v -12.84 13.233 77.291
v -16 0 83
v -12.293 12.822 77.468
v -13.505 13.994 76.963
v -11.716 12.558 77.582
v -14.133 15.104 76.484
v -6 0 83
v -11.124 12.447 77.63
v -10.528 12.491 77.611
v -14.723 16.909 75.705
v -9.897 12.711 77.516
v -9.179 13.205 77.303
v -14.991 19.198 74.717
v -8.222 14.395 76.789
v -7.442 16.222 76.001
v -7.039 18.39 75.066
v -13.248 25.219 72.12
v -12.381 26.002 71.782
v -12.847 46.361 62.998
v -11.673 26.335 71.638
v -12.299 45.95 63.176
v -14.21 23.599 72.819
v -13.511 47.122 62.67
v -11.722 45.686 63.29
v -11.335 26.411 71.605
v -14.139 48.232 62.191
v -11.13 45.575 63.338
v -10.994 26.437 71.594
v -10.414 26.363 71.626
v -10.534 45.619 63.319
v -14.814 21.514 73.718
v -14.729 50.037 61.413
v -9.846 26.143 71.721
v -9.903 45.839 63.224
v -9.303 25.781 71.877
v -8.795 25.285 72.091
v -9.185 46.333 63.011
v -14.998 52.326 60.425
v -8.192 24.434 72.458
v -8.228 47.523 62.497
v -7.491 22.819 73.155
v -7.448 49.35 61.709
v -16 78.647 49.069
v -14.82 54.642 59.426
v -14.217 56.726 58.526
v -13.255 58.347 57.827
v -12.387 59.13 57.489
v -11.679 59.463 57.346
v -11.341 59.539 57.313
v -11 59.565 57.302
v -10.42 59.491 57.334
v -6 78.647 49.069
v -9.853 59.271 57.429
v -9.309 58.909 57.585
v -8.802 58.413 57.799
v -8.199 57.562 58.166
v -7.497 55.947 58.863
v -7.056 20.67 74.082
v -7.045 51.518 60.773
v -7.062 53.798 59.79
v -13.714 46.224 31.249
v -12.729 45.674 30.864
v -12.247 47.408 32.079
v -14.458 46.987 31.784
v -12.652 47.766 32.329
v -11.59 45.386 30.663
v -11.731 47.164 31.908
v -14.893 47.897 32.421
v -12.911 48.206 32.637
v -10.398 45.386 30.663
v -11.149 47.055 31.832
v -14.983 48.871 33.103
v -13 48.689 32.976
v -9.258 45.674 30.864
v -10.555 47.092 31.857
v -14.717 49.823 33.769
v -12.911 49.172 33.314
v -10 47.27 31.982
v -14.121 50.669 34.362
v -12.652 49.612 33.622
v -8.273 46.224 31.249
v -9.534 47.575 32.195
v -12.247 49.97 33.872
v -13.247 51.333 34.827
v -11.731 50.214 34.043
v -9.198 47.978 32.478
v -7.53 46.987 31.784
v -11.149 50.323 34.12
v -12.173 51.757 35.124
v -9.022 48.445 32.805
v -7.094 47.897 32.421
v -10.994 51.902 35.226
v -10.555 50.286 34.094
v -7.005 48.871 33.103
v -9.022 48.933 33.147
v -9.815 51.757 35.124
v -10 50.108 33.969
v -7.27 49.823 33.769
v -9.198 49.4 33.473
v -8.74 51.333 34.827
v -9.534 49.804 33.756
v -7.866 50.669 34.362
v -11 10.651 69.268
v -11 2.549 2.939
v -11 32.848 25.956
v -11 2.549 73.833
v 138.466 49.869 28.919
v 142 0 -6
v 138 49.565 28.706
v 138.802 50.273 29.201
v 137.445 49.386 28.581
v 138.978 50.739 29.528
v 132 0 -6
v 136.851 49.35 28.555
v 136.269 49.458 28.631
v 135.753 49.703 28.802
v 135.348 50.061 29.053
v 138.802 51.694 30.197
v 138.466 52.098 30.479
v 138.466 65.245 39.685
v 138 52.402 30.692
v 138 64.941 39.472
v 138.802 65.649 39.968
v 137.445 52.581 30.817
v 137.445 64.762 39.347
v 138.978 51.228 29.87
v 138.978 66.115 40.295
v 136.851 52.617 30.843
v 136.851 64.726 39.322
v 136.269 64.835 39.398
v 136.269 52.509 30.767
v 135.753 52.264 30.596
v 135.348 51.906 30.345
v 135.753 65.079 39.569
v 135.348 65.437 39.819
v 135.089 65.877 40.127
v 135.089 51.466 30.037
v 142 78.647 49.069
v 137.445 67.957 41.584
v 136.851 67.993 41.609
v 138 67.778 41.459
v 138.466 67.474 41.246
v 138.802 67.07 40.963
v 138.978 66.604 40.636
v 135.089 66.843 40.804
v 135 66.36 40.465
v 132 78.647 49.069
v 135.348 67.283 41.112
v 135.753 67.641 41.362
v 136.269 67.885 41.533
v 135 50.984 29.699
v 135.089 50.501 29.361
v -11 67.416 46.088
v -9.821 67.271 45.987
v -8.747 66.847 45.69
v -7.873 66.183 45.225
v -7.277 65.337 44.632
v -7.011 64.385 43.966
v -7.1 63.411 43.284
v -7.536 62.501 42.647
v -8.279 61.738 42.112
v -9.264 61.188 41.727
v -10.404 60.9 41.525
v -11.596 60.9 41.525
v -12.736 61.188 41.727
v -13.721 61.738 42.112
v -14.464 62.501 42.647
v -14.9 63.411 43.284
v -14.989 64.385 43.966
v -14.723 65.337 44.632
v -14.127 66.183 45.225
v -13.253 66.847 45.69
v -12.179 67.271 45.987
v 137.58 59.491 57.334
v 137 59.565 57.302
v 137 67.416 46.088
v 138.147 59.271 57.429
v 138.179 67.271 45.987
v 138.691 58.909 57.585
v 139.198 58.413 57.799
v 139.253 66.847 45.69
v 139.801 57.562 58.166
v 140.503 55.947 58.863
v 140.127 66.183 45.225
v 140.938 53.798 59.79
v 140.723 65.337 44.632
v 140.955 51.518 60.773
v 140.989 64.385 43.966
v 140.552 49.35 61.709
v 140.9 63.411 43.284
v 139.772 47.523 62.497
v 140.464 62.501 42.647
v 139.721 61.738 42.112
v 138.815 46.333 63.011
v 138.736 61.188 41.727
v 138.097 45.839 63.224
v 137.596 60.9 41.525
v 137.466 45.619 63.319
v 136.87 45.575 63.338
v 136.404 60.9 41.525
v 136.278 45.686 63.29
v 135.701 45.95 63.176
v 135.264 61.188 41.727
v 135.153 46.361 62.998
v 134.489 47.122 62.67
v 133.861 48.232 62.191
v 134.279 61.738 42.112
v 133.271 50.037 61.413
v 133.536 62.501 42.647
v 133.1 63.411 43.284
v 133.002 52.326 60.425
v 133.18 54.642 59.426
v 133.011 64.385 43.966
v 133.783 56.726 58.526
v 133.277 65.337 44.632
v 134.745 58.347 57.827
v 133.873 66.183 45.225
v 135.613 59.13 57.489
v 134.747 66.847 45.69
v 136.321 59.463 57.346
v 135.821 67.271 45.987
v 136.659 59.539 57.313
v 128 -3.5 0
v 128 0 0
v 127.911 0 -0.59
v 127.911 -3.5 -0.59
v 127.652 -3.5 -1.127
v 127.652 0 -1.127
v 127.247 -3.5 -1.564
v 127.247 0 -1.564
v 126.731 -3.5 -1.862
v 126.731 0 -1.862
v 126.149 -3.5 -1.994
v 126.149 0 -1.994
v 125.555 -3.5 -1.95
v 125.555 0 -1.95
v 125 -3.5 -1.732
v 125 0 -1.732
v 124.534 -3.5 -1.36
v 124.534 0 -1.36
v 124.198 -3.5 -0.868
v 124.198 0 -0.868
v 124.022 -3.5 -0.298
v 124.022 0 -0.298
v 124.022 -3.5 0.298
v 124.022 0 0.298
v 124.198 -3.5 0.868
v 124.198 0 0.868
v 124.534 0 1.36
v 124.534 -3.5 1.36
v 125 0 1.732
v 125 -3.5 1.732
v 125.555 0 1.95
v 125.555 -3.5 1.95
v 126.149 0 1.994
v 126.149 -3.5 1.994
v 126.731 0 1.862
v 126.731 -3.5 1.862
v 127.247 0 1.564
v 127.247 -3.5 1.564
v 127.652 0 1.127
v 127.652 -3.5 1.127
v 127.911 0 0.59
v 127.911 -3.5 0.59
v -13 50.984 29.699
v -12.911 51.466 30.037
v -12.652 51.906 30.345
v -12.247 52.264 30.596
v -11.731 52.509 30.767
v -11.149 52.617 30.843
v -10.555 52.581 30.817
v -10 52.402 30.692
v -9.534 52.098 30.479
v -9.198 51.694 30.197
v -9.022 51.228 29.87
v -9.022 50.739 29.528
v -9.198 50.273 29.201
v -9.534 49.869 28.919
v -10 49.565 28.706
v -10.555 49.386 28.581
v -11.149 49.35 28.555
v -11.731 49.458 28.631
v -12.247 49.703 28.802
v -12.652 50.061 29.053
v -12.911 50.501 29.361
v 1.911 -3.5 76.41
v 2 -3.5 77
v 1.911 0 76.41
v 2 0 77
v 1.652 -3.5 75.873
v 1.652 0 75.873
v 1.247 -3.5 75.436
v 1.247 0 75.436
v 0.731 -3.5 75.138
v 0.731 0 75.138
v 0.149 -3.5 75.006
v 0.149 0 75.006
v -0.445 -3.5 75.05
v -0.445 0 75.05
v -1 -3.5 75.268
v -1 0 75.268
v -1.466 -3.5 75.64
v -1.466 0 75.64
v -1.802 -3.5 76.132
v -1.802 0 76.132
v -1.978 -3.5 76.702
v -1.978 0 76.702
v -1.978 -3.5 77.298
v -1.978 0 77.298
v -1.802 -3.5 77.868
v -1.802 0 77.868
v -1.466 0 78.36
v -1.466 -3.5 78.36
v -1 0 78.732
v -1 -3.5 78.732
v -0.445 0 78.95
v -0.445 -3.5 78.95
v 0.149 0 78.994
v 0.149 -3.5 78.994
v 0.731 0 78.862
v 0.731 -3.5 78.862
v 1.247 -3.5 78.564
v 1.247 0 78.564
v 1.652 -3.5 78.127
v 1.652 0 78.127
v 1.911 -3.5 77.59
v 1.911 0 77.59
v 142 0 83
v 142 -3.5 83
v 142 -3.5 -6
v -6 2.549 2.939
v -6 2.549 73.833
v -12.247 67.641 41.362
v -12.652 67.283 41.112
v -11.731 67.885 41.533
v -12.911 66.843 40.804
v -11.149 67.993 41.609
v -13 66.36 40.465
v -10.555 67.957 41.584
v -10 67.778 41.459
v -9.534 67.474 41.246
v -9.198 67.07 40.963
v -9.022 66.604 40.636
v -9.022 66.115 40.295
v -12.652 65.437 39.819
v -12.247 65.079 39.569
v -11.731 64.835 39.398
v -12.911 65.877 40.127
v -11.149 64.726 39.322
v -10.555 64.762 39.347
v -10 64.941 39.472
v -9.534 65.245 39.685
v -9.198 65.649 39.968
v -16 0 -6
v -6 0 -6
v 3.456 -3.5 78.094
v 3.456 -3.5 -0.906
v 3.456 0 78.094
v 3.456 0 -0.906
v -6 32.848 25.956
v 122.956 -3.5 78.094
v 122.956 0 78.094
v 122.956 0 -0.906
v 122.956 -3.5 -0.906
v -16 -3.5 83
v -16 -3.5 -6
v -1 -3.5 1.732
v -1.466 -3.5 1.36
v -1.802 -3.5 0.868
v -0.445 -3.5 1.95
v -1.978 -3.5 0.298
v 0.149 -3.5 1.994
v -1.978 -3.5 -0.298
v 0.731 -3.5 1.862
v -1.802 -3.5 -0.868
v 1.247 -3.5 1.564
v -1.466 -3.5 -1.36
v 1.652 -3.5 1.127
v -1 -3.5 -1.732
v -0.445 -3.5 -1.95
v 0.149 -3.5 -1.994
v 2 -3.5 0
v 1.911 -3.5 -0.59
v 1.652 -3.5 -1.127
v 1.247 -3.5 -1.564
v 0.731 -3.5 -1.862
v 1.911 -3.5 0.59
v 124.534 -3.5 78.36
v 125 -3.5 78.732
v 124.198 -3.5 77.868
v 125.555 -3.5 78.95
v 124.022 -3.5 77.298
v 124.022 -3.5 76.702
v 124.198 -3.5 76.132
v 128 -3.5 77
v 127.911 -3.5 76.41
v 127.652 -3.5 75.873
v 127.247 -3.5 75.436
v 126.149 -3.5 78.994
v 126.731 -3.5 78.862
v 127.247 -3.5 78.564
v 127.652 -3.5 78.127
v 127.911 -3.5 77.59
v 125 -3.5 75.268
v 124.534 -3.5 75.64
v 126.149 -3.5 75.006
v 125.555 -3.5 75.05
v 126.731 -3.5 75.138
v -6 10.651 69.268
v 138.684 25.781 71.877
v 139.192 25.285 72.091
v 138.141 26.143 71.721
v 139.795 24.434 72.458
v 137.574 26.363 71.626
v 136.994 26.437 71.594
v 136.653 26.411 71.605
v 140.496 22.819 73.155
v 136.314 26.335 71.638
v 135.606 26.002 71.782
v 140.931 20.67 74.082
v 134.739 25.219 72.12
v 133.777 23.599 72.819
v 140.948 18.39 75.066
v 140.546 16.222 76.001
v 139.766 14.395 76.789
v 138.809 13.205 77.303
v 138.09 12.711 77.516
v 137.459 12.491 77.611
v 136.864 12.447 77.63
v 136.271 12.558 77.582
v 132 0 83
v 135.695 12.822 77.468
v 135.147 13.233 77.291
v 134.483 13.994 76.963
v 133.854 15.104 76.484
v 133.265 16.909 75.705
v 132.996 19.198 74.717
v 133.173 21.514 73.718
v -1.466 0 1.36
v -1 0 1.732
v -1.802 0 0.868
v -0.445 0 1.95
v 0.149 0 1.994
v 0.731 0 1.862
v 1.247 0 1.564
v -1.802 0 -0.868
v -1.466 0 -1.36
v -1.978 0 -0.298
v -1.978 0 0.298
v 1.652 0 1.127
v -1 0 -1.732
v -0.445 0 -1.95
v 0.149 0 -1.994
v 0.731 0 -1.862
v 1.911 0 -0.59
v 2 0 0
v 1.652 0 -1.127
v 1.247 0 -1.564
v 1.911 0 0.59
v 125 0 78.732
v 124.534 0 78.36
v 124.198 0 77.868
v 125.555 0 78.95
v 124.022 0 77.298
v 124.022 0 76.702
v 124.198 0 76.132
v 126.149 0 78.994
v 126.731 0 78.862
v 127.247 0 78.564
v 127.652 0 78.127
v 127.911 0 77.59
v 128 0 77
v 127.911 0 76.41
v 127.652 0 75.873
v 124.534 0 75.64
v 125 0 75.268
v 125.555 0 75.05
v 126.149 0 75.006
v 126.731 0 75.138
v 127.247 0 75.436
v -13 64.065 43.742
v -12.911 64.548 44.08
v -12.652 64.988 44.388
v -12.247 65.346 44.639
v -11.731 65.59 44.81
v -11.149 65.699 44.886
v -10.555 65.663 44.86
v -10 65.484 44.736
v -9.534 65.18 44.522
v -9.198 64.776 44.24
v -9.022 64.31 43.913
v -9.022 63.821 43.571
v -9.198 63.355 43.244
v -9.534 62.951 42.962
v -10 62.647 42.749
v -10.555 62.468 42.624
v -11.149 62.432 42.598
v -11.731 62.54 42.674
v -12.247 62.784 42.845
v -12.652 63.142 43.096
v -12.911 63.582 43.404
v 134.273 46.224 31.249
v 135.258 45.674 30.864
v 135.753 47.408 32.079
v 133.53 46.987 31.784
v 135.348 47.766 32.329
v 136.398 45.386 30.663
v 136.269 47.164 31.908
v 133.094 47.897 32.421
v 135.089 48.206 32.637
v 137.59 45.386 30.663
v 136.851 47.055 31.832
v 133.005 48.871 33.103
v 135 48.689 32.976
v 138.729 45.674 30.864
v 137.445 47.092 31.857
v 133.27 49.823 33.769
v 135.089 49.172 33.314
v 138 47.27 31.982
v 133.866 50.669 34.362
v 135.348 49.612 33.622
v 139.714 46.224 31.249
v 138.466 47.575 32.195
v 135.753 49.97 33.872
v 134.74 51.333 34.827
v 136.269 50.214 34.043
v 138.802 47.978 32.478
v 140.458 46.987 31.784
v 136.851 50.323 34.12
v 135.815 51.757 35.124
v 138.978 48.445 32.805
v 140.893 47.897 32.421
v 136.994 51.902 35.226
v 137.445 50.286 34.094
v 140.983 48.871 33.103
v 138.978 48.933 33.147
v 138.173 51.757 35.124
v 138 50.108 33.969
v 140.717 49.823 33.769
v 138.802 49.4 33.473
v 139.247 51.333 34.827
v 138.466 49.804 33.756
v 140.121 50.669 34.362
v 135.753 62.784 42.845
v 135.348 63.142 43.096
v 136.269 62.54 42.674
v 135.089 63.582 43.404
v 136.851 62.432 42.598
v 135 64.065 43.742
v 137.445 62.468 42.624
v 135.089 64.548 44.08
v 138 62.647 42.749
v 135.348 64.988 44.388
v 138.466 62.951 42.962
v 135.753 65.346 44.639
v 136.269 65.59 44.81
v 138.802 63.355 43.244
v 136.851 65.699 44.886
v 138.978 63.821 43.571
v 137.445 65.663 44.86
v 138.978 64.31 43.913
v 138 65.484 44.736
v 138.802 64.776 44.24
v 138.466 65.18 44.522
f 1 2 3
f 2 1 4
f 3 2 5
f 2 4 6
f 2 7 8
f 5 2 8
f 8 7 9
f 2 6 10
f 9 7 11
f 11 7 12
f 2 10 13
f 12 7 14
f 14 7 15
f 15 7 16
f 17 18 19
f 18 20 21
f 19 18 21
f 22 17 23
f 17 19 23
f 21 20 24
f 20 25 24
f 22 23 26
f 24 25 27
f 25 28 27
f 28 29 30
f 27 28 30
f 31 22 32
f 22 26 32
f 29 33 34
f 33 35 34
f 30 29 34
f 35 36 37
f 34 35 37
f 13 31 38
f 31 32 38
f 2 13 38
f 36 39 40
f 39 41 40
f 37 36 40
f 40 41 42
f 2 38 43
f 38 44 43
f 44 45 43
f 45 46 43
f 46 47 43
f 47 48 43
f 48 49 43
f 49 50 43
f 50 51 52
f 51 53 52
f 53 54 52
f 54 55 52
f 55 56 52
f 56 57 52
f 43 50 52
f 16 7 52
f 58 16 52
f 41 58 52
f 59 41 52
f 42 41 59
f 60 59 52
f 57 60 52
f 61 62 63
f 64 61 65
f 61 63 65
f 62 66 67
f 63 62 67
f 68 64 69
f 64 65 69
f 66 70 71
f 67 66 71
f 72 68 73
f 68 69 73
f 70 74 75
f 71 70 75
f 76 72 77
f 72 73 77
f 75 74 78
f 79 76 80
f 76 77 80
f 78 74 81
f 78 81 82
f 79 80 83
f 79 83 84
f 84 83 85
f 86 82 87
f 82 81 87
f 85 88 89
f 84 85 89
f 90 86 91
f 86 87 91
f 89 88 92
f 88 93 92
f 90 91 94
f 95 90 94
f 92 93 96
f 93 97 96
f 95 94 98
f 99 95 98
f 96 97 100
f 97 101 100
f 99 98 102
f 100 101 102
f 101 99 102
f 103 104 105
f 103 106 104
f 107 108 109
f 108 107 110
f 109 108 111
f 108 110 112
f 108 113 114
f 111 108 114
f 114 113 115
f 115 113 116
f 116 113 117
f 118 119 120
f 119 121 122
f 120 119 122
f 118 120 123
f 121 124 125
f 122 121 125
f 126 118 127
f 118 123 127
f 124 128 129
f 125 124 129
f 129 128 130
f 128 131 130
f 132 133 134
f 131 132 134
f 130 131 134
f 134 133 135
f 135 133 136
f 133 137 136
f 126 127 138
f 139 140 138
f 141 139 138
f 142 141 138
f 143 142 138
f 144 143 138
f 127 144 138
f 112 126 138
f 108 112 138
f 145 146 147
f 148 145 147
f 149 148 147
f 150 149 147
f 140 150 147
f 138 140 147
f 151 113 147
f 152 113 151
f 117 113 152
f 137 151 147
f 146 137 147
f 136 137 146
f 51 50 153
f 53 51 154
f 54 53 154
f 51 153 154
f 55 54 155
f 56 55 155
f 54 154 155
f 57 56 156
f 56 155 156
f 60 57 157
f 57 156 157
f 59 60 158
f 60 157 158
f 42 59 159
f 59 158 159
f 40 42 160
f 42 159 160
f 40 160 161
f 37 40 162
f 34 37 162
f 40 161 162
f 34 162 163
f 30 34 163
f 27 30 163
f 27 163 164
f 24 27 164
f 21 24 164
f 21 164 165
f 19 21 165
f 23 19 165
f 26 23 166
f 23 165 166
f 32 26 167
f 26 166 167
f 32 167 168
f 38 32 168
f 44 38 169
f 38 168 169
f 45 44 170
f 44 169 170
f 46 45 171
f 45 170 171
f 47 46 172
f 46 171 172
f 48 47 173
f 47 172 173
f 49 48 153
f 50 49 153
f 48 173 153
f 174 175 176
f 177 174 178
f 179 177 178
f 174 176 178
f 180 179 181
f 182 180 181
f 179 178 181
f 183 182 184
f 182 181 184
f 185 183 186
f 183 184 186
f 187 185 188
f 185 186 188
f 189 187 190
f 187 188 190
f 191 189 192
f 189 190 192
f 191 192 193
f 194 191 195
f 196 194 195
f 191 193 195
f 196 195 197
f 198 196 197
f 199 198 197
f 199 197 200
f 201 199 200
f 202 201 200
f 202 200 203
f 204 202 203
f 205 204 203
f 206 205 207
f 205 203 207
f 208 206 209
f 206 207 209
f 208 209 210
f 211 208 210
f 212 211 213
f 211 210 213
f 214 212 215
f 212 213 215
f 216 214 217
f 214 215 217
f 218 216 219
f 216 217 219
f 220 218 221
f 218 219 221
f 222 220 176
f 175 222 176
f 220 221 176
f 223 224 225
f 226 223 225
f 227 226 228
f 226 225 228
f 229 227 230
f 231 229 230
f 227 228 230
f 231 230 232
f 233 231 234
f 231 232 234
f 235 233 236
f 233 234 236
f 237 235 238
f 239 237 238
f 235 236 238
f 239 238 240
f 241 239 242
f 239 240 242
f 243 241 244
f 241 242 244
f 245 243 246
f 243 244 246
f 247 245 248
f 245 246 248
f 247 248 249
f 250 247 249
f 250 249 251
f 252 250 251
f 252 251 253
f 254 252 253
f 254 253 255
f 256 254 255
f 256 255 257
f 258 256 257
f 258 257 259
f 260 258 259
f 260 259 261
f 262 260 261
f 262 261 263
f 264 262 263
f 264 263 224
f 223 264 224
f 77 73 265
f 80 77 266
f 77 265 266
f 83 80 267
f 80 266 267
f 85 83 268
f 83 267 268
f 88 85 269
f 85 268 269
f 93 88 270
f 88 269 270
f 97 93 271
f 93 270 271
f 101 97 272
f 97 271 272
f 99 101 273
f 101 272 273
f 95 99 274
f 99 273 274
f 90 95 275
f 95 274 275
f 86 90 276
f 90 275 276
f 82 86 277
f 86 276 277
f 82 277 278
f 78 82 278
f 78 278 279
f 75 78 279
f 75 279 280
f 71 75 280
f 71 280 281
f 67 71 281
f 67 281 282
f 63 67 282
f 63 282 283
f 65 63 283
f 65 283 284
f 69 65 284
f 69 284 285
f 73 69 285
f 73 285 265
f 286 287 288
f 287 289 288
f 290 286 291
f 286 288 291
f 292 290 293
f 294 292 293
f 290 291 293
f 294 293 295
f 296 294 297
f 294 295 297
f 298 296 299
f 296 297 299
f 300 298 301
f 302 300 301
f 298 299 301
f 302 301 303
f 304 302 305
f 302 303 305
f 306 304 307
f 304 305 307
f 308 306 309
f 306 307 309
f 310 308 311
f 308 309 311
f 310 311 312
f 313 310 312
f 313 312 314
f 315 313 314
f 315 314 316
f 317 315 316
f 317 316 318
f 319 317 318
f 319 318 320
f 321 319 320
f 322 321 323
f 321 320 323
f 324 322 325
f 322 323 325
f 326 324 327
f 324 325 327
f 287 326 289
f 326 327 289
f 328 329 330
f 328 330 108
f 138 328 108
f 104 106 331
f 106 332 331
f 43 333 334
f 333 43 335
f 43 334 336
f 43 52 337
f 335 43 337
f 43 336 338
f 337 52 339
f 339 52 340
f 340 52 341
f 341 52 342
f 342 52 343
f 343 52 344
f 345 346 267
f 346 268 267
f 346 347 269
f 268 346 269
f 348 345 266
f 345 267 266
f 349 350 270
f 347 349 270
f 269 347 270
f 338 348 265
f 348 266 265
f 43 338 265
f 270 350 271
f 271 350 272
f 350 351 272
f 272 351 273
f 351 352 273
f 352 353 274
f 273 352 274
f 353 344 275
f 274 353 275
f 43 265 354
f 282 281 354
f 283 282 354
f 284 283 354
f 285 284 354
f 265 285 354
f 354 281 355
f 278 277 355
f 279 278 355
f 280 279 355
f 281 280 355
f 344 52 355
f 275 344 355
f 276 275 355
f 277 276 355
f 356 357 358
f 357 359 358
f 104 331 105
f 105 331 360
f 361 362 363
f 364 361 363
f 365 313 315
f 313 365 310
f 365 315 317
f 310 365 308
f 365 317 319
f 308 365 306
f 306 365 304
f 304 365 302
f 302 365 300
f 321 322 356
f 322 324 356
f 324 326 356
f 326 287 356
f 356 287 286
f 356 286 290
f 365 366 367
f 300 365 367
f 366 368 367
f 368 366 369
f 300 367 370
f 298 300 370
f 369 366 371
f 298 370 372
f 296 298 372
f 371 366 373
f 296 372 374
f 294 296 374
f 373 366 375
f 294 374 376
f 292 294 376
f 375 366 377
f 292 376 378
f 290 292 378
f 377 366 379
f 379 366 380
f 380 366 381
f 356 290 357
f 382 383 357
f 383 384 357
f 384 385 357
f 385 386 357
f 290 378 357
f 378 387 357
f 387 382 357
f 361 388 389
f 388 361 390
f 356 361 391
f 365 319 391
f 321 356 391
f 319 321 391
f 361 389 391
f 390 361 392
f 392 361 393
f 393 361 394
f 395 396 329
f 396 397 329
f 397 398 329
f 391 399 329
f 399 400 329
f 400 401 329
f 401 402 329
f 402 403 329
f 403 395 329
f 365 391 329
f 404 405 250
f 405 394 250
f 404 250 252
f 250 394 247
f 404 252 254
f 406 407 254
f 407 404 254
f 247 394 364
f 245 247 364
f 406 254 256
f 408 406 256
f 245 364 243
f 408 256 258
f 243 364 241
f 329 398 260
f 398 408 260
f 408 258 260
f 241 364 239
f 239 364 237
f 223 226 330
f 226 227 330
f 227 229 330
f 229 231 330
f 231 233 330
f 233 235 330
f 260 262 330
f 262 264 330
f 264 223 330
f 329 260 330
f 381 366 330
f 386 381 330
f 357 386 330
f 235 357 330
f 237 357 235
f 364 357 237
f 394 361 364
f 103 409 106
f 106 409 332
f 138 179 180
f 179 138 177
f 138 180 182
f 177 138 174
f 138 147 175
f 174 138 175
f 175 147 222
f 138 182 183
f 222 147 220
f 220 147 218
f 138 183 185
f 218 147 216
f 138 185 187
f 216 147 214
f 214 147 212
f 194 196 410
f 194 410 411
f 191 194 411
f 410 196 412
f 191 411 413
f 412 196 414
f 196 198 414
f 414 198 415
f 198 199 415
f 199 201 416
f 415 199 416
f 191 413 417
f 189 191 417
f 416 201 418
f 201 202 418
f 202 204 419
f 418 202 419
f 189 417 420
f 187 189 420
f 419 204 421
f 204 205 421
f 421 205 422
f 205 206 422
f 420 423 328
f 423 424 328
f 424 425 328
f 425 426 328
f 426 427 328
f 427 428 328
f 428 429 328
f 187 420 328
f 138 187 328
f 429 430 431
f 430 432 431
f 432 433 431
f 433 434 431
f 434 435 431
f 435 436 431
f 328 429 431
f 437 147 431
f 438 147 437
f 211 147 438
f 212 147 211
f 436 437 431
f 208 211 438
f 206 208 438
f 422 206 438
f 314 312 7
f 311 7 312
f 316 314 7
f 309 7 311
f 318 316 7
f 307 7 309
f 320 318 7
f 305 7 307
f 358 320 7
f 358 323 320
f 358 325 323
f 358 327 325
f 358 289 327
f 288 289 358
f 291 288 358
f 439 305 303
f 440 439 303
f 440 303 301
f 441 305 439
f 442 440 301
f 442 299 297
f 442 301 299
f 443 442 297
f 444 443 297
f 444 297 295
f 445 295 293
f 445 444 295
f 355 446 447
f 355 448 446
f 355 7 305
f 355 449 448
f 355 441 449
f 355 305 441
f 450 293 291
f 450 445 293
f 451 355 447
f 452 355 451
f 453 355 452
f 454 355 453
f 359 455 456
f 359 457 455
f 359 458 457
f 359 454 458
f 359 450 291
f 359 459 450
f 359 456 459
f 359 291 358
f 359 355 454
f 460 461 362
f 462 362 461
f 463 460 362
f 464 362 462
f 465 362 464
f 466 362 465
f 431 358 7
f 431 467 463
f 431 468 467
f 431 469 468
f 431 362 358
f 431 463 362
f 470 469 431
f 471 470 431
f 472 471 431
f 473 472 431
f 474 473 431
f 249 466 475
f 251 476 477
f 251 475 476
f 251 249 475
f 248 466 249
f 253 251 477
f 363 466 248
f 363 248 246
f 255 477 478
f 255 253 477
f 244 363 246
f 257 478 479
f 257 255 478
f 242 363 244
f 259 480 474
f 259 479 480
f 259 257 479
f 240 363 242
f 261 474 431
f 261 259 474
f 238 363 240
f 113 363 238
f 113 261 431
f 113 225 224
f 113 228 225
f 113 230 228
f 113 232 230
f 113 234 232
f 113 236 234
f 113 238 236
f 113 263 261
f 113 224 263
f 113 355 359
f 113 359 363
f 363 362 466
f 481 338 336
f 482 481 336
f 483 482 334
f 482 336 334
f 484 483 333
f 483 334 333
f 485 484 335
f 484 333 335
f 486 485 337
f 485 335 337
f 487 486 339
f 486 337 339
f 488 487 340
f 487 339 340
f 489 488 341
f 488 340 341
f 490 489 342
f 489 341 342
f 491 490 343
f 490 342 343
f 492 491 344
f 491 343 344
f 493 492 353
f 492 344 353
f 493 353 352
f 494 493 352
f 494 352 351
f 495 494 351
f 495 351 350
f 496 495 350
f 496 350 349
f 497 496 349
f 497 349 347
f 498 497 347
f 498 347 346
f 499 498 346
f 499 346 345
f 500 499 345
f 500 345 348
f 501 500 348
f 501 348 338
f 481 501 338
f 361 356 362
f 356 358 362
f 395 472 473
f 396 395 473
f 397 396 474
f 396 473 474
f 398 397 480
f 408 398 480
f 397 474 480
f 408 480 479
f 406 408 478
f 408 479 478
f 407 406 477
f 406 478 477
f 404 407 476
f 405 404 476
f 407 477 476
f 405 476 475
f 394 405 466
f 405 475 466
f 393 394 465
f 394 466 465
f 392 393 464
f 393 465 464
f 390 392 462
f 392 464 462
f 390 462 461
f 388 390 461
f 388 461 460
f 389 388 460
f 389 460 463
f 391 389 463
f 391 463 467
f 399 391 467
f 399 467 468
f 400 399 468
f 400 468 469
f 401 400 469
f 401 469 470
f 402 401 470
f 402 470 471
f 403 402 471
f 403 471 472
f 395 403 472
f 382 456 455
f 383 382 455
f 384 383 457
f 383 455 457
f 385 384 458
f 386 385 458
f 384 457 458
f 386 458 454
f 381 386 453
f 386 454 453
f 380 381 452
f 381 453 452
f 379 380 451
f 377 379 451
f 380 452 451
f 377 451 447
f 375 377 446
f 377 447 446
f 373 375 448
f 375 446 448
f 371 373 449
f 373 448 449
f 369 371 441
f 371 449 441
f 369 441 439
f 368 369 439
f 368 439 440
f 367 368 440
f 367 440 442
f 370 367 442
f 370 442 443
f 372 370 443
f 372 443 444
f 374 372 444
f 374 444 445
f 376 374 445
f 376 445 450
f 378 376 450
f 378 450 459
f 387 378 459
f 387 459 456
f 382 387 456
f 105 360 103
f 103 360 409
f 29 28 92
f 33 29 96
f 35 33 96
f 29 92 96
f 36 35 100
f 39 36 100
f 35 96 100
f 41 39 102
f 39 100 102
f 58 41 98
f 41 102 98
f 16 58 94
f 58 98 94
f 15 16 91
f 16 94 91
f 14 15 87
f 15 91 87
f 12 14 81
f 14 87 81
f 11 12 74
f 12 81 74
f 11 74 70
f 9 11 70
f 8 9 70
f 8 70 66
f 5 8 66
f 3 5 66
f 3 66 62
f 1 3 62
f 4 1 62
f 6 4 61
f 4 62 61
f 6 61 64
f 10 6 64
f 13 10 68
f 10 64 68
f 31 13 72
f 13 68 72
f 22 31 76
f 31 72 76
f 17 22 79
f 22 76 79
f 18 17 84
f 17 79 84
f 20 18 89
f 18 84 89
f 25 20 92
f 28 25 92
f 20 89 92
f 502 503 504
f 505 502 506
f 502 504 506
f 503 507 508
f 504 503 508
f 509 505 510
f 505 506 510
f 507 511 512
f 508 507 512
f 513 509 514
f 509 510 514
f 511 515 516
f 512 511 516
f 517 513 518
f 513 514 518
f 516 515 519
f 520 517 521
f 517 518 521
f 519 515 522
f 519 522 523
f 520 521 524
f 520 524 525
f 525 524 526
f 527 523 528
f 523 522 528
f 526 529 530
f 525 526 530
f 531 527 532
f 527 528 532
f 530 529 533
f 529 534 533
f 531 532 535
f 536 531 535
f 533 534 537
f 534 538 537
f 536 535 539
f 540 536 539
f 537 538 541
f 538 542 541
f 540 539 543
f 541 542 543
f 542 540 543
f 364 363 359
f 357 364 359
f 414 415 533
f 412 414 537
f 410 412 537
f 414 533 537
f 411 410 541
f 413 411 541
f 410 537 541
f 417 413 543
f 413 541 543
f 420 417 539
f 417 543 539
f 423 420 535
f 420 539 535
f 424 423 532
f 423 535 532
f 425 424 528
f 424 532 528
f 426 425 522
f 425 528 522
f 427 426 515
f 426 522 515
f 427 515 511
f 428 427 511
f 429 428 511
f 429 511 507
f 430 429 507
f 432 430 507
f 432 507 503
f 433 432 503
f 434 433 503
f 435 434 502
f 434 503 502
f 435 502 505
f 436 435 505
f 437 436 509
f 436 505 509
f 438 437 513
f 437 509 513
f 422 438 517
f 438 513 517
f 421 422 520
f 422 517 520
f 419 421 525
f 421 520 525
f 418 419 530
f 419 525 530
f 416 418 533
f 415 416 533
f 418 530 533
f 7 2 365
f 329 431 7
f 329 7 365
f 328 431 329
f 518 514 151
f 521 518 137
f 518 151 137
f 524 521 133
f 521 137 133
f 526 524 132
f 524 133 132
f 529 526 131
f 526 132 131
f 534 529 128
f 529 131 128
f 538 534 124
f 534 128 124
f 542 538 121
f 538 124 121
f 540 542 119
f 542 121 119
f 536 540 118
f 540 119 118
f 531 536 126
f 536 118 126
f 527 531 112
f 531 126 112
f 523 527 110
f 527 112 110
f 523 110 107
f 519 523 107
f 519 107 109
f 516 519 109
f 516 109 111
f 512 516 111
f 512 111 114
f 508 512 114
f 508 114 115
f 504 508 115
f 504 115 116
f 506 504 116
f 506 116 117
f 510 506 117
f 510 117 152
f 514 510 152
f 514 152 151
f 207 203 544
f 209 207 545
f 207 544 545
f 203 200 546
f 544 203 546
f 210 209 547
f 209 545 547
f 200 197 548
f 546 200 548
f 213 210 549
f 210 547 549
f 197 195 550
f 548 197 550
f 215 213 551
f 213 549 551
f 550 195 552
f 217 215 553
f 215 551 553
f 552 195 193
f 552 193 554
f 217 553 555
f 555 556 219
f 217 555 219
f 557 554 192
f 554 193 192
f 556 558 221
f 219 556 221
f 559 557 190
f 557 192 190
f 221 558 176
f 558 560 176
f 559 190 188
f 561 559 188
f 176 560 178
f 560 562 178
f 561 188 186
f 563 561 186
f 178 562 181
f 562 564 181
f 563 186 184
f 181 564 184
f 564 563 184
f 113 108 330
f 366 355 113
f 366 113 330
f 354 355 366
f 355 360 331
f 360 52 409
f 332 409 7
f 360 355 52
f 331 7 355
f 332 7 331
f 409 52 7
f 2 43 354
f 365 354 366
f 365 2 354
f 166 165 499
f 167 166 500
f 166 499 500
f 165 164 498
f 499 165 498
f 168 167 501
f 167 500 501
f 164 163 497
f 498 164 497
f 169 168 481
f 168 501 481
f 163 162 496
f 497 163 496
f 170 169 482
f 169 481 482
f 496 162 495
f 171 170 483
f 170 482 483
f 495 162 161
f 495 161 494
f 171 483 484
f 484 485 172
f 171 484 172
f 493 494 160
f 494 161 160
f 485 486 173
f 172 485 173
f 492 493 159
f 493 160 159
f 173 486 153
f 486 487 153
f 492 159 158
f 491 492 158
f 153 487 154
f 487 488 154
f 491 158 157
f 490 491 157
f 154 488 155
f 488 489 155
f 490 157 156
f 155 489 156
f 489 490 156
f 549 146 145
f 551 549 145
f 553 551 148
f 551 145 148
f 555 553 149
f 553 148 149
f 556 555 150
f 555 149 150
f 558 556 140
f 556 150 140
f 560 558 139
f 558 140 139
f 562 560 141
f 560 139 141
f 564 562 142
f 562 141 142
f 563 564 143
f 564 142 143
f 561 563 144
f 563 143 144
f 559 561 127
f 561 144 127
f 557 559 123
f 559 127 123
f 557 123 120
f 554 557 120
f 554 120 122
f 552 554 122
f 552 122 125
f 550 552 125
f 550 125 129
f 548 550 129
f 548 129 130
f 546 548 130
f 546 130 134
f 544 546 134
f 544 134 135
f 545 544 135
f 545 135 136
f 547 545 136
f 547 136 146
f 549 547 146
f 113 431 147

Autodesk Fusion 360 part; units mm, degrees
sketch "Sketch2" plane through (0, 0, 0) normal (0, 1, 0) x (1, 0, 0)
  line L0 (0, 0) -> (126, 0) construction
  line L1 (0, 0) -> (0, -77) construction
  circle A0 centre (126, 0) radius 2
  circle A1 centre (0, 0) radius 2
  circle A2 centre (0, -77) radius 2
  line L2 (126, 0) -> (126, -77) construction
  circle A3 centre (126, -77) radius 2
  line L3 (3.4555, -78.0942) -> (122.9555, -78.0942)
  line L4 (122.9555, -78.0942) -> (122.9555, 0.9058)
  line L5 (122.9555, 0.9058) -> (3.4555, 0.9058)
  line L6 (3.4555, 0.9058) -> (3.4555, -78.0942)
  line L7 (-6, -77) -> (-6, -83) construction
  line L8 (-6, -83) -> (0, -83) construction
  line L9 (-6, -83) -> (132, -83)
  line L10 (132, -83) -> (132, 6)
  line L11 (132, 6) -> (-6, 6)
  line L12 (-6, 6) -> (-6, -83)
  dimension "d16" = 4
  dimension "d17" = 4
  dimension "d18" = 4
  dimension "d20" = 4
  dimension "d23" = 6
  dimension "d24" = 6
  dimension "d25" = 138
  dimension "d26" = 89
extrude "Extrude2" add sketch "Sketch2" against normal blind 3.5
sketch "Sketch3" plane through (132, 0, 0) normal (1, 0, 0) x (0, 1, 0)
  line L0 (0, -6) -> (0, 83)
  line L1 (0, 83) -> (-3.5, 83)
  line L2 (-3.5, 83) -> (-3.5, -6)
  line L3 (-3.5, -6) -> (0, -6)
  line L4 (0, -6) -> (78.6469, 49.0692)
  line L5 (0, -6) -> (96.0102, -6) construction
  line L6 (78.6469, 49.0692) -> (0, 83)
  dimension "d29" = 35
extrude "Extrude3" add sketch "Sketch3" along normal blind 10
sketch "Sketch4" plane through (-6, 0, 0) normal (-1, 0, 0) x (0, -1, 0)
  line L0 (0, 83) -> (0, -6)
  line L1 (0, -6) -> (3.5, -6)
  line L2 (3.5, -6) -> (3.5, 83)
  line L3 (3.5, 83) -> (0, 83)
  line L4 (0, 83) -> (-78.6469, 49.0692)
  line L5 (-78.6469, 49.0692) -> (0, -6)
  point P0 (-78.6469, 49.0692)
extrude "Extrude4" add sketch "Sketch4" along normal blind 10
sketch "Sketch5" plane through (0, 2.8191, -4.0261) normal (0, 0.5736, -0.8192) x (-1, 0, 0)
  line L0 (-132, -3.4415) -> (-132, 92.5687)
  line L1 (-132, 92.5687) -> (-142, 92.5687)
  line L2 (-142, 92.5687) -> (-142, -3.4415)
  line L3 (-142, -3.4415) -> (-132, -3.4415)
  line L4 (-137, 92.5687) -> (-137, -3.4415) construction
  line L5 (6, 47.6068) -> (-132, 47.6068)
  line L6 (-63, 47.6068) -> (-63, 87.5387) construction
  line L7 (-137, 92.5687) -> (-137, 77.5687) construction
  circle A0 centre (-137, 77.5687) radius 2
  circle A1 centre (-137, 58.7979) radius 2
  circle A2 centre (11, 77.5687) radius 2
  circle A3 centre (11, 58.7979) radius 2
  circle A4 centre (-137, 77.5687) radius 4
  circle A5 centre (-137, 58.7979) radius 4
  circle A6 centre (11, 58.7979) radius 4
  circle A7 centre (11, 77.5687) radius 4
  dimension "d34" = 15
  dimension "d35" = 4
  dimension "d36" = 4
  dimension "d39" = 8
  dimension "d40" = 8
extrude "Extrude6" cut sketch "Sketch5" against normal blind 64 contours A0 | A1 | A2 | A3
ref_plane "WorkPlane1" through (137, 37.0292, 24.8112) normal (0, 0.5736, -0.8192) x (0, 0.8192, 0.5736)
sketch "Sketch6" plane through (137, 37.0292, 24.8112) normal (0, 0.5736, -0.8192) x (0, 0.8192, 0.5736)
  circle A0 centre (33.0958, 0) radius 4
  circle A1 centre (14.1568, -0.0063) radius 4
  line L0 (3.0432, -143) -> (3.0432, -5)
  line L1 (3.0432, -74) -> (11.3701, -74) construction
  circle A2 centre (33.0958, -148) radius 4
  circle A3 centre (14.1568, -147.9937) radius 4
  dimension "d44" = 8
  dimension "d45" = 8
extrude "Extrude7" cut sketch "Sketch6" against normal blind 65
sketch "Sketch7" plane through (-6, 0, 0) normal (1, 0, 0) x (0, 1, 0)
  line L0 (0, 83) -> (0, -6)
  line L1 (0, -6) -> (78.6469, 49.0692)
  line L2 (78.6469, 49.0692) -> (0, 83)
  line L3 (2.5489, 73.8327) -> (2.5489, 2.9392)
  line L4 (2.5489, 2.9392) -> (32.8483, 25.9556)
  line L5 (32.8483, 25.9556) -> (10.651, 69.2676)
  line L6 (10.651, 69.2676) -> (2.5489, 73.8327)
extrude "Extrude8" cut sketch "Sketch7" against normal blind 5 contours L3 L4 L5 L6
